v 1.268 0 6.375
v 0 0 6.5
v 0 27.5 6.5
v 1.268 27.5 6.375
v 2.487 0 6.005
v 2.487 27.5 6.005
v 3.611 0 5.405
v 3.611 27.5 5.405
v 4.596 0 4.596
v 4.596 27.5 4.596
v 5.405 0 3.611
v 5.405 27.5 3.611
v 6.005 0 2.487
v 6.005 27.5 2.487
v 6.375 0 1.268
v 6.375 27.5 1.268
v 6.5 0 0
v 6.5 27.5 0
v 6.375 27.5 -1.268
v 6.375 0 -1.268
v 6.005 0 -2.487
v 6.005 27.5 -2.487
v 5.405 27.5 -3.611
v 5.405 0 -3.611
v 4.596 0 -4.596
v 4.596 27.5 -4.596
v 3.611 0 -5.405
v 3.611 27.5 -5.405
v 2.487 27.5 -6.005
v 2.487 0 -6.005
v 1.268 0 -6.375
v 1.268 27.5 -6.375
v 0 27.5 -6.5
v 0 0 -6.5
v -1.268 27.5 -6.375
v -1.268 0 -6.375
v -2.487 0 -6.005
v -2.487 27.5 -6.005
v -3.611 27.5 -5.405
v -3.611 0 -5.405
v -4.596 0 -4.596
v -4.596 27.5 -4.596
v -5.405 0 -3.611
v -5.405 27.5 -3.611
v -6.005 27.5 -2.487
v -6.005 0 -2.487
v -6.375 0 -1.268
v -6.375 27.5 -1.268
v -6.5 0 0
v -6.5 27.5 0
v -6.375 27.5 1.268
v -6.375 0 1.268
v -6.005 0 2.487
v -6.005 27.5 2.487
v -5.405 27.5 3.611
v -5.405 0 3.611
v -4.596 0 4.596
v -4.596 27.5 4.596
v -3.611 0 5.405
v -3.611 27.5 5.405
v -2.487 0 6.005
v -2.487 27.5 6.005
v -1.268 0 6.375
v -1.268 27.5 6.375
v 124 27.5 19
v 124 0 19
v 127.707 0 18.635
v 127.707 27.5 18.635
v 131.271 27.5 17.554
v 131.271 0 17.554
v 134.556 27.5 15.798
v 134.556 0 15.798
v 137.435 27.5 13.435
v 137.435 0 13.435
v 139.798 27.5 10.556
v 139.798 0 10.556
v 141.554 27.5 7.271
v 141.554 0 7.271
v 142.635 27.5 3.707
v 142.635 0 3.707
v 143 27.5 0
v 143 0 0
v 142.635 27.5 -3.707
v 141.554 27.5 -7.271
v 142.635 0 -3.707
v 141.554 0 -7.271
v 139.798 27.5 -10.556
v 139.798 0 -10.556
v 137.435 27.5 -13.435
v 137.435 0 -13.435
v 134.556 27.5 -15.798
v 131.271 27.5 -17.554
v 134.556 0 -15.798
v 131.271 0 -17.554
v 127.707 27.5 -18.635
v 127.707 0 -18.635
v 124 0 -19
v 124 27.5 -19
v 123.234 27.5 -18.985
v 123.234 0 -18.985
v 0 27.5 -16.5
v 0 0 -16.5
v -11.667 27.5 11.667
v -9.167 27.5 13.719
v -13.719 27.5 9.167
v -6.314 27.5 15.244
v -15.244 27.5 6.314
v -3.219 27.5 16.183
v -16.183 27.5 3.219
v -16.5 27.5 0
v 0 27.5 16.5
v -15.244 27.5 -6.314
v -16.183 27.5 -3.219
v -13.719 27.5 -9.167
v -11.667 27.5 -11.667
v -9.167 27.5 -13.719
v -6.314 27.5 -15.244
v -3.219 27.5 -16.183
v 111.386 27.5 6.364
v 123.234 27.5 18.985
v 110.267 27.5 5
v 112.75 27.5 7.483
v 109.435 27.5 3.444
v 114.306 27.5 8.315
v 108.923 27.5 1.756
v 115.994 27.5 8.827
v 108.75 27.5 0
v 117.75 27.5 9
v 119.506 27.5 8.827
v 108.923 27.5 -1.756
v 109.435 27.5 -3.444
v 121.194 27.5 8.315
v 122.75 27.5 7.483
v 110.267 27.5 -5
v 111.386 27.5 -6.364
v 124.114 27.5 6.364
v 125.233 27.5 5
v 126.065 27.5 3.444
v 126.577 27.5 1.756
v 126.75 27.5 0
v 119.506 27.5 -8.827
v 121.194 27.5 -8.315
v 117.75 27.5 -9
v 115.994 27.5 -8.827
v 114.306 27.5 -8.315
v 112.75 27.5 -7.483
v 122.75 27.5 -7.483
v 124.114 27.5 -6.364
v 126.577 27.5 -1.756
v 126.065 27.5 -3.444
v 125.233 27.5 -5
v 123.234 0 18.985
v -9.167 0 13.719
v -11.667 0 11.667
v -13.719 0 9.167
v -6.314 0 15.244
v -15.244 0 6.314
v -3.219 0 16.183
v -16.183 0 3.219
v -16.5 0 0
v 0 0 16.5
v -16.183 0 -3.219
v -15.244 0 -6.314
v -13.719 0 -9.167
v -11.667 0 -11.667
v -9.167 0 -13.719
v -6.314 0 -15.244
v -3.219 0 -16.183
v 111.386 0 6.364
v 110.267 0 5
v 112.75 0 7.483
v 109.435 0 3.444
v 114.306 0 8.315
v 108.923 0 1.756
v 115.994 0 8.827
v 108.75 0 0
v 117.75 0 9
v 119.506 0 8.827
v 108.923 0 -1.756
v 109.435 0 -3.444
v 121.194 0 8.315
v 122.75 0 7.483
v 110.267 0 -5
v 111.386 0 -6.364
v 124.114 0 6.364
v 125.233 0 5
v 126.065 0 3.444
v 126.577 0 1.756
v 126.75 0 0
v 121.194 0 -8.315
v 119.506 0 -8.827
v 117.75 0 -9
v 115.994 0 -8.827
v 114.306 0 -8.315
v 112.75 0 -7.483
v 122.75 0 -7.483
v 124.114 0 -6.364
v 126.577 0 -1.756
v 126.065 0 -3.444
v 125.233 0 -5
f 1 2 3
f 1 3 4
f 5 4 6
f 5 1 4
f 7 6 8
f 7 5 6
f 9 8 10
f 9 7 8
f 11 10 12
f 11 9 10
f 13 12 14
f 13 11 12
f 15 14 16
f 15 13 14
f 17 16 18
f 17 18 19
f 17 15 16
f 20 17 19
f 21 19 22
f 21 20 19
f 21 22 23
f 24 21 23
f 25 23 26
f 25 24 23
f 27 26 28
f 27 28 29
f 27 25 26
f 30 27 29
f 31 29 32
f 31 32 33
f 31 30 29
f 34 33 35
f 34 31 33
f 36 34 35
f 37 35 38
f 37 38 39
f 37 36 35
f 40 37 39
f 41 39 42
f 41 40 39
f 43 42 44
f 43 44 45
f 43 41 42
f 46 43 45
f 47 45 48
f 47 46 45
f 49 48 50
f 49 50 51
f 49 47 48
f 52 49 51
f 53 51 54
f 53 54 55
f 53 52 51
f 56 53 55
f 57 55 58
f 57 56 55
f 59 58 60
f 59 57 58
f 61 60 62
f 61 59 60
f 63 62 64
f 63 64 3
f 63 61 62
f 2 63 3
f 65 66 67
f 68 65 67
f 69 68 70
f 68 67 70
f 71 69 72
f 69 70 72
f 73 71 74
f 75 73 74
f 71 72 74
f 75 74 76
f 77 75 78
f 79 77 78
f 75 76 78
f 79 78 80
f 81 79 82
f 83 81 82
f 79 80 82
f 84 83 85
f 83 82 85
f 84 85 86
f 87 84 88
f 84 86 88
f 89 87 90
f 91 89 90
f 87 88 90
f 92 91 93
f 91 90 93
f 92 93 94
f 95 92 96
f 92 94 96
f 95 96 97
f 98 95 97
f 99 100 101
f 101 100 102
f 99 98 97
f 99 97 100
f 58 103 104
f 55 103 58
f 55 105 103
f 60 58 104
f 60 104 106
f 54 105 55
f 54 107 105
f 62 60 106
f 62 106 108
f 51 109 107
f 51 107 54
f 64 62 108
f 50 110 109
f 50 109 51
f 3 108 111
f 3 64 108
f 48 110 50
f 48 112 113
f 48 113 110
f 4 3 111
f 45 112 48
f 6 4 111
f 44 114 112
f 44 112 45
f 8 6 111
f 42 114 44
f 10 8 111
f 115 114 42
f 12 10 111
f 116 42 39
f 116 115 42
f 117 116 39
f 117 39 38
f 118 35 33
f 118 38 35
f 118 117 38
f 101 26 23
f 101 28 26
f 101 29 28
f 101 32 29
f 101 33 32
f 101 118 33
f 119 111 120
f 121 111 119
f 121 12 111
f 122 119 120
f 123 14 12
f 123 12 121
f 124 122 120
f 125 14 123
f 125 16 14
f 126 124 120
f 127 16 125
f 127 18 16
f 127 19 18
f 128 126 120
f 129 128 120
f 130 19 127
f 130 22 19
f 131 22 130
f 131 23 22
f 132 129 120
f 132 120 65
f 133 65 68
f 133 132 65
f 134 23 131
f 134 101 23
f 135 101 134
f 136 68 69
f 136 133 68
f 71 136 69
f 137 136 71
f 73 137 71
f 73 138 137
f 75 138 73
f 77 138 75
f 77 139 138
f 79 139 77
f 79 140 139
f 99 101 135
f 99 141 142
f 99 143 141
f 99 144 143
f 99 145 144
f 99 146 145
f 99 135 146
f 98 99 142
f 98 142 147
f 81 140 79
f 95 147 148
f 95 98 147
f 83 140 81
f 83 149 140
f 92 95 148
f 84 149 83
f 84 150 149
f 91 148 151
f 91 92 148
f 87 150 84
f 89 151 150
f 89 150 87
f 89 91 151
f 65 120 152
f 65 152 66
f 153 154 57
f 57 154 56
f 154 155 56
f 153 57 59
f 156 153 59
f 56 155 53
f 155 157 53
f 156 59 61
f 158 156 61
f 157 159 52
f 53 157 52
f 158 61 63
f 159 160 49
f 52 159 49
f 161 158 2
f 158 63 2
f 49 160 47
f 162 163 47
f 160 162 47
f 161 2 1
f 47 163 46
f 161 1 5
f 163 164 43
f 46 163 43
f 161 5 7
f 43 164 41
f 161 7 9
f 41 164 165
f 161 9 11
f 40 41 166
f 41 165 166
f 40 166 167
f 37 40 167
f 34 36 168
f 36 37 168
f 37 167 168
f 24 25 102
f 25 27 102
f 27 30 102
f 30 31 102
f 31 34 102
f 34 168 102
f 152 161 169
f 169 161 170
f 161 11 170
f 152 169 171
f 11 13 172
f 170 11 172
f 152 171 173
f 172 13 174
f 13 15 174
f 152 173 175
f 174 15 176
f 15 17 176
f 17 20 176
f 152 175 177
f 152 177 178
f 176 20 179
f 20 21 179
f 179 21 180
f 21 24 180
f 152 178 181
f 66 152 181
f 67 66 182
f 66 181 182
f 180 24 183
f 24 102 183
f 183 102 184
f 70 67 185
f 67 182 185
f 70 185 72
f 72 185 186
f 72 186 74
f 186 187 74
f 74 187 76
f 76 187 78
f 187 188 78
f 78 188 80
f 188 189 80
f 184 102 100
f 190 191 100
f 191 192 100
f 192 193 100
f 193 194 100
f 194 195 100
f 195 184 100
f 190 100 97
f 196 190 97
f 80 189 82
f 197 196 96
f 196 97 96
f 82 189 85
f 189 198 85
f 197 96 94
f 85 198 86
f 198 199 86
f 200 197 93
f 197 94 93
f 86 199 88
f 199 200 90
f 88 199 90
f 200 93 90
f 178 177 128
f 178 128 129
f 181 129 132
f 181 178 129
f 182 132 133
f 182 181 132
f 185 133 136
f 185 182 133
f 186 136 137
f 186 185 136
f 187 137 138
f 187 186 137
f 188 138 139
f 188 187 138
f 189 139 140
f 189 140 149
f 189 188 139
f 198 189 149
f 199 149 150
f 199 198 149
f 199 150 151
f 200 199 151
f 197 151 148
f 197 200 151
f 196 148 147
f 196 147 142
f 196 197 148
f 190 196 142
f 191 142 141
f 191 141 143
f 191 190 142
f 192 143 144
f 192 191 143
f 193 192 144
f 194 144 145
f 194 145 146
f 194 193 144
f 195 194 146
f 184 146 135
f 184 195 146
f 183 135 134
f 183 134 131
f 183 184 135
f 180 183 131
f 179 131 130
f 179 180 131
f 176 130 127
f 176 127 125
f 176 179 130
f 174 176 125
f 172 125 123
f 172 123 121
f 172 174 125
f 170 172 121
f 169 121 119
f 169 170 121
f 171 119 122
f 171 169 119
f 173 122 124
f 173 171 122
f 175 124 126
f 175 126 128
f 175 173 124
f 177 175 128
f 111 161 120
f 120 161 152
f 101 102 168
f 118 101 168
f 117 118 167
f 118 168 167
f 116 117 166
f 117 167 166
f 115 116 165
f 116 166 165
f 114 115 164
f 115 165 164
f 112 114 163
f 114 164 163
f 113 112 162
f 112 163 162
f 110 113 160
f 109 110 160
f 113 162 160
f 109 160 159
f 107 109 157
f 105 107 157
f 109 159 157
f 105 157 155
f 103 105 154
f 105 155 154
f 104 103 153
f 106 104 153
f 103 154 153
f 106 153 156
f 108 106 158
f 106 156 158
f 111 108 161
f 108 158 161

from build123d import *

# Parameters (mm, degrees)
SKETCH1_R           = 6.5
SKETCH1_R_2         = 9
BOSS_EXTRUDE1_DEPTH = 27.5


with BuildPart() as part:
    # Sketch1 → Boss-Extrude1 (new body)
    with BuildSketch(Plane(origin=(0, 0, 0), x_dir=(1, 0, 0), z_dir=(0, 1, 0))):
        with BuildLine():
            ThreePointArc((124, -19), (143, 0), (124, 19))
            Line((124, 19), (123.234182256, 18.984560126))
            Line((123.234182256, 18.984560126), (0, 16.5))
            ThreePointArc((0, 16.5), (-16.5, 0), (0, -16.5))
            Line((0, -16.5), (123.234182256, -18.984560126))
            Line((123.234182256, -18.984560126), (124, -19))
        make_face()
        with Locations(Location((0, 0, 0), (0, 0, 270))):
            Circle(SKETCH1_R, mode=Mode.SUBTRACT)
        with Locations(Location((117.75, 0, 0), (0, 0, 270))):
            Circle(SKETCH1_R_2, mode=Mode.SUBTRACT)
    extrude(amount=BOSS_EXTRUDE1_DEPTH)


solid = part.part
